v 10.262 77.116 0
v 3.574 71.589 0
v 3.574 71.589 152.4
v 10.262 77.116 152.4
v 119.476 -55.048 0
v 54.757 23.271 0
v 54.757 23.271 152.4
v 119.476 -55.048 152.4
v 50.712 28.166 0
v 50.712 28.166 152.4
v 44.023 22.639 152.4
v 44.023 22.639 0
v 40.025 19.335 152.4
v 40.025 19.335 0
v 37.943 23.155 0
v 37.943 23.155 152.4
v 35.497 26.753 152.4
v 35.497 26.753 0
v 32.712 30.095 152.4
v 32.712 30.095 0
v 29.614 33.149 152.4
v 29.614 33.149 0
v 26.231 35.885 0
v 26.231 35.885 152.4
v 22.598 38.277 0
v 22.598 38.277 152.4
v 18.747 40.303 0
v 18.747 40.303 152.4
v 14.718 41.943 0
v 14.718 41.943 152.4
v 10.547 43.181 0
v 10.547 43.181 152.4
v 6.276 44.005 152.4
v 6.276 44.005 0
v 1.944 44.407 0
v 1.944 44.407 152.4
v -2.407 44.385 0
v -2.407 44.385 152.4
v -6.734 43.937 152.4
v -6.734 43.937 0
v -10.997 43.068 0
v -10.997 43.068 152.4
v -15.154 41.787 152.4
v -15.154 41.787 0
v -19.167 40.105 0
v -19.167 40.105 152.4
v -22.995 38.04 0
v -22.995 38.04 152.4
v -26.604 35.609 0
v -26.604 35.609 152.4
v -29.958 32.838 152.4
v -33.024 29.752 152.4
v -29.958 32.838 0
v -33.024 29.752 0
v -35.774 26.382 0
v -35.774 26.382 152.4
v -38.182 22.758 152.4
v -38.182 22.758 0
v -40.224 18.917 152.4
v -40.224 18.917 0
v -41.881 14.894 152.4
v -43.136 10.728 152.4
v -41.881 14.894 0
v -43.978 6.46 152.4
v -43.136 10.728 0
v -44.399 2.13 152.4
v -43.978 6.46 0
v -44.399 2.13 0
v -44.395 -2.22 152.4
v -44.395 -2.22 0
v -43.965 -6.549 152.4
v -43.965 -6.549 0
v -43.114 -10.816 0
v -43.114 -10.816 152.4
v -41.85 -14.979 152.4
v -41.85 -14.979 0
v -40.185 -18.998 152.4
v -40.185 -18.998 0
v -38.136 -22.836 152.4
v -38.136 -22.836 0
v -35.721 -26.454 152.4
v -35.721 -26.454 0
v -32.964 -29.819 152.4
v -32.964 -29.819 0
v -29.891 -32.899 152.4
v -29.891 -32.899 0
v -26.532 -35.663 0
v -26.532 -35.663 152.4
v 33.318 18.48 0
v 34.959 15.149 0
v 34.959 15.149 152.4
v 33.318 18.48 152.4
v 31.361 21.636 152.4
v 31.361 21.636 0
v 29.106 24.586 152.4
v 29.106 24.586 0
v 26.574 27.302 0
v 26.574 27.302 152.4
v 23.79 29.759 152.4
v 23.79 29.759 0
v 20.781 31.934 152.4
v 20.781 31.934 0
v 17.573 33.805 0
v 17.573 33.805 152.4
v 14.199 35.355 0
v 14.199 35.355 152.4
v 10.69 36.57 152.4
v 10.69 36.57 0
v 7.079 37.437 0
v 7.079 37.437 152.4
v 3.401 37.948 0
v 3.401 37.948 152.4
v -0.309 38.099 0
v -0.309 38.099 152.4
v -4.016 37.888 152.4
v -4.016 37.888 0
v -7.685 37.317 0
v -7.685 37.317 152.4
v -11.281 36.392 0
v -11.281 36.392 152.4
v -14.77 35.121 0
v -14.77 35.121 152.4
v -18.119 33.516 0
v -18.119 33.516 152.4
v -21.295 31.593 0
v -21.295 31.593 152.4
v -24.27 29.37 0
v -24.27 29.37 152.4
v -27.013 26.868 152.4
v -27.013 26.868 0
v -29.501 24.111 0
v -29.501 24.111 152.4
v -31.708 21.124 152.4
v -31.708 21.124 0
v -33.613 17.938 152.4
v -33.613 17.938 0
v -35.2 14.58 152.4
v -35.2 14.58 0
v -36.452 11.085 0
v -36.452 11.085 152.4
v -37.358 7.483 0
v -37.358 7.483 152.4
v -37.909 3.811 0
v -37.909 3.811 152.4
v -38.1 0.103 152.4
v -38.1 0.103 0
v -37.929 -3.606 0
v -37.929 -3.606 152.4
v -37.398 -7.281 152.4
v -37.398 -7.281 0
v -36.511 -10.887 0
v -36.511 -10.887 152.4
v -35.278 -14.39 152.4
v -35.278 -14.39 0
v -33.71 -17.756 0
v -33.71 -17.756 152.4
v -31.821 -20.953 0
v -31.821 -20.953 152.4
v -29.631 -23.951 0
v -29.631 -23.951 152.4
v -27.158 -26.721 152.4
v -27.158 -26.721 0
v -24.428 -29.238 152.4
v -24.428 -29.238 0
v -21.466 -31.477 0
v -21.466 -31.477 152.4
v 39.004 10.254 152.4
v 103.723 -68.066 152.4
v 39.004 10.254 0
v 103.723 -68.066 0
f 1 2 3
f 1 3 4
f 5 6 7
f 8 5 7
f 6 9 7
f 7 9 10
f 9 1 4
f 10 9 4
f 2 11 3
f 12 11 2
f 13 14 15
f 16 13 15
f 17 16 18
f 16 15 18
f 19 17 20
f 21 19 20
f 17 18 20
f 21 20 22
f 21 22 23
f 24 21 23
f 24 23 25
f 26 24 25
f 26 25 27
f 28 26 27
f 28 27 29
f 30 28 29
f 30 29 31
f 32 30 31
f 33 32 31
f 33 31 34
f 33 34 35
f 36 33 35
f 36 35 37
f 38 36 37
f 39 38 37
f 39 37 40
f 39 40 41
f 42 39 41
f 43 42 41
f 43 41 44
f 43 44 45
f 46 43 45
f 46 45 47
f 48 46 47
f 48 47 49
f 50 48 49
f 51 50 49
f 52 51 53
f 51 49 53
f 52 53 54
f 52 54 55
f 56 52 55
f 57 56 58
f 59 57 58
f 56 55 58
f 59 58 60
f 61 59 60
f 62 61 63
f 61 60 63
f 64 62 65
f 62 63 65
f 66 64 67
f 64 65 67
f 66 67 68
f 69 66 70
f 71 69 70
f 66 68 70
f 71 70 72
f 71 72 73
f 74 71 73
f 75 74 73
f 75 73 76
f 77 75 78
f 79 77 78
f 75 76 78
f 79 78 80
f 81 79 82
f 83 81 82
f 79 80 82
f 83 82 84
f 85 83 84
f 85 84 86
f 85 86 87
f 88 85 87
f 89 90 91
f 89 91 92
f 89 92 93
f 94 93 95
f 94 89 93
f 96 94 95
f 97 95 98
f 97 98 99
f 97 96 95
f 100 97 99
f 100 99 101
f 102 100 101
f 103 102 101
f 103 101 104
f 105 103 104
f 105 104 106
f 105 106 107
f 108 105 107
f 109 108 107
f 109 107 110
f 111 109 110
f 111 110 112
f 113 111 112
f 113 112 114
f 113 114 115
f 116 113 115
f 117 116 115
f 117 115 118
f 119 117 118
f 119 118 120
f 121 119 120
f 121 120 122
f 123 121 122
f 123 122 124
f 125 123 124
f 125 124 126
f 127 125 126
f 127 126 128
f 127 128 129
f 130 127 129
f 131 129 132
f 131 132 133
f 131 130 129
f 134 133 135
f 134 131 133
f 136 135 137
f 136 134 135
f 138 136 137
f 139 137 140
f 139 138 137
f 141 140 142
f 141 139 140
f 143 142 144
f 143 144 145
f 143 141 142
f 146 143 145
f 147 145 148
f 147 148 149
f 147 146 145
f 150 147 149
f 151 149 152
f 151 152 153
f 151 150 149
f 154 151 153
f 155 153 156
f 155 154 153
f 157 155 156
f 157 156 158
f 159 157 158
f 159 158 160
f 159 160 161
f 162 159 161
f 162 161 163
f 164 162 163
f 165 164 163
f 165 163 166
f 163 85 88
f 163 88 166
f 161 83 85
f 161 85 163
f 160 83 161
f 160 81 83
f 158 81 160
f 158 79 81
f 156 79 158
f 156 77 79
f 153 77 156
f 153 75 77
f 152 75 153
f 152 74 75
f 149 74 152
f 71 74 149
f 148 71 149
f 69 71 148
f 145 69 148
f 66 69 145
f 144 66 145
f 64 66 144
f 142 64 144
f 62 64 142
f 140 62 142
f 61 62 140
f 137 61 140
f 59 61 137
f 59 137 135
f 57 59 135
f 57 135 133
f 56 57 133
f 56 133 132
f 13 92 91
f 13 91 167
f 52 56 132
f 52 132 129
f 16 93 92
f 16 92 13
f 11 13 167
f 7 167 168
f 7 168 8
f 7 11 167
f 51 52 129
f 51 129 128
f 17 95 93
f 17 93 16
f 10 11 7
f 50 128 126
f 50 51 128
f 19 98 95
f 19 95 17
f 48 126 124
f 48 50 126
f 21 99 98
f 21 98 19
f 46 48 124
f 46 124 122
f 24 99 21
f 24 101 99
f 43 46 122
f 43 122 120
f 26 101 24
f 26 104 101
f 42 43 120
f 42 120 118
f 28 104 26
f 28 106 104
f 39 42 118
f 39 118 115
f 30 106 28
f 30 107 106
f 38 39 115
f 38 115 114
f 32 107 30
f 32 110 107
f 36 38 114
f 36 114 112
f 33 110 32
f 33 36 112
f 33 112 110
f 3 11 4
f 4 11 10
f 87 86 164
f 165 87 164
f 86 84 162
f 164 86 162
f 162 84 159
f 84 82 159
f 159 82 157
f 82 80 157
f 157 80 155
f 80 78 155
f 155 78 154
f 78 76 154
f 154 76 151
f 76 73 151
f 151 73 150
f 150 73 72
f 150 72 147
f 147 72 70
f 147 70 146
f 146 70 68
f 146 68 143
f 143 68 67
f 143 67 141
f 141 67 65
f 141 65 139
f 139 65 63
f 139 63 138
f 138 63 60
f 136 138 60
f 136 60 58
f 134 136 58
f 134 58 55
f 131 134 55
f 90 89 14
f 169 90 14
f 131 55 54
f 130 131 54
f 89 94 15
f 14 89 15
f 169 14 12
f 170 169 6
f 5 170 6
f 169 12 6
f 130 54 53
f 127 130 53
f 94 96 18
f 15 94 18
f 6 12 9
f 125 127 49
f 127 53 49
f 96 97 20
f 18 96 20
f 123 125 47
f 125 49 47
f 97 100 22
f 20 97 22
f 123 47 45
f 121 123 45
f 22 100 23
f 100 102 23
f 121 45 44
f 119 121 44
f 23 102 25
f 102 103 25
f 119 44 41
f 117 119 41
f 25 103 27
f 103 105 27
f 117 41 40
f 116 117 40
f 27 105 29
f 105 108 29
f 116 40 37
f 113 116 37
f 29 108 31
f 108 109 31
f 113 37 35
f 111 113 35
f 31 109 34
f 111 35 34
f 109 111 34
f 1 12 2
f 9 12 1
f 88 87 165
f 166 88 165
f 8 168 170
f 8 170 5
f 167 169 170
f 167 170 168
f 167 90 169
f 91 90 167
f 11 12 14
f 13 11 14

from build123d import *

# Parameters (mm, degrees)
SKETCH2_R           = 44.45
SKETCH2_R_2         = 38.1
BOSS_EXTRUDE1_DEPTH = 152.4
CUT_EXTRUDE1_DEPTH  = 152.4
SKETCH5_W           = 20.435442018
SKETCH5_H           = 152.4
BOSS_EXTRUDE2_DEPTH = 6.35
SKETCH6_W           = 8.676407007
SKETCH6_H           = 152.4
BOSS_EXTRUDE3_DEPTH = 63.5
SKETCH7_W           = 20.435442018
SKETCH7_H           = 152.4
BOSS_EXTRUDE4_DEPTH = 101.6


with BuildPart() as part:
    # Sketch2 → Boss-Extrude1 (new body)
    with BuildSketch(Plane.XY):
        Circle(SKETCH2_R)
        Circle(SKETCH2_R_2, mode=Mode.SUBTRACT)
    extrude(amount=BOSS_EXTRUDE1_DEPTH)

    # Sketch3 → Cut-Extrude1 (cut)
    with BuildSketch(Plane.XY.offset(152.4)):
        Polygon((-26.531587494, -35.663389702), (40.024531053, 19.334927308), (75.854578195, -15.638849725), (-9.866811461, -86.474293044), align=None)
    extrude(amount=-CUT_EXTRUDE1_DEPTH, mode=Mode.SUBTRACT)

    # Sketch5 → Boss-Extrude2 (add)
    with BuildSketch(Plane(origin=(6.746471779, -8.164231197, 0), x_dir=(-0.770864065, -0.63699968, 0), z_dir=(0.63699968, -0.770864065, 0))):
        with Locations((-46.816087742, -76.2)):
            Rectangle(SKETCH5_W, SKETCH5_H)
    extrude(amount=BOSS_EXTRUDE2_DEPTH)

    # Sketch6 → Boss-Extrude3 (add)
    with BuildSketch(Plane(origin=(6.746471779, -8.164231197, 0), x_dir=(0.770864065, 0.63699968, 0), z_dir=(-0.63699968, 0.770864065, 0))):
        with Locations((52.695605247, -76.2)):
            Rectangle(SKETCH6_W, SKETCH6_H)
    extrude(amount=BOSS_EXTRUDE3_DEPTH)

    # Sketch7 → Boss-Extrude4 (add)
    with BuildSketch(Plane(origin=(10.791419749, -13.059218012, 0), x_dir=(0.770864065, 0.63699968, 0), z_dir=(0.63699968, -0.770864065, 0))):
        with Locations((46.816087742, 76.2)):
            Rectangle(SKETCH7_W, SKETCH7_H)
    extrude(amount=BOSS_EXTRUDE4_DEPTH)


solid = part.part
